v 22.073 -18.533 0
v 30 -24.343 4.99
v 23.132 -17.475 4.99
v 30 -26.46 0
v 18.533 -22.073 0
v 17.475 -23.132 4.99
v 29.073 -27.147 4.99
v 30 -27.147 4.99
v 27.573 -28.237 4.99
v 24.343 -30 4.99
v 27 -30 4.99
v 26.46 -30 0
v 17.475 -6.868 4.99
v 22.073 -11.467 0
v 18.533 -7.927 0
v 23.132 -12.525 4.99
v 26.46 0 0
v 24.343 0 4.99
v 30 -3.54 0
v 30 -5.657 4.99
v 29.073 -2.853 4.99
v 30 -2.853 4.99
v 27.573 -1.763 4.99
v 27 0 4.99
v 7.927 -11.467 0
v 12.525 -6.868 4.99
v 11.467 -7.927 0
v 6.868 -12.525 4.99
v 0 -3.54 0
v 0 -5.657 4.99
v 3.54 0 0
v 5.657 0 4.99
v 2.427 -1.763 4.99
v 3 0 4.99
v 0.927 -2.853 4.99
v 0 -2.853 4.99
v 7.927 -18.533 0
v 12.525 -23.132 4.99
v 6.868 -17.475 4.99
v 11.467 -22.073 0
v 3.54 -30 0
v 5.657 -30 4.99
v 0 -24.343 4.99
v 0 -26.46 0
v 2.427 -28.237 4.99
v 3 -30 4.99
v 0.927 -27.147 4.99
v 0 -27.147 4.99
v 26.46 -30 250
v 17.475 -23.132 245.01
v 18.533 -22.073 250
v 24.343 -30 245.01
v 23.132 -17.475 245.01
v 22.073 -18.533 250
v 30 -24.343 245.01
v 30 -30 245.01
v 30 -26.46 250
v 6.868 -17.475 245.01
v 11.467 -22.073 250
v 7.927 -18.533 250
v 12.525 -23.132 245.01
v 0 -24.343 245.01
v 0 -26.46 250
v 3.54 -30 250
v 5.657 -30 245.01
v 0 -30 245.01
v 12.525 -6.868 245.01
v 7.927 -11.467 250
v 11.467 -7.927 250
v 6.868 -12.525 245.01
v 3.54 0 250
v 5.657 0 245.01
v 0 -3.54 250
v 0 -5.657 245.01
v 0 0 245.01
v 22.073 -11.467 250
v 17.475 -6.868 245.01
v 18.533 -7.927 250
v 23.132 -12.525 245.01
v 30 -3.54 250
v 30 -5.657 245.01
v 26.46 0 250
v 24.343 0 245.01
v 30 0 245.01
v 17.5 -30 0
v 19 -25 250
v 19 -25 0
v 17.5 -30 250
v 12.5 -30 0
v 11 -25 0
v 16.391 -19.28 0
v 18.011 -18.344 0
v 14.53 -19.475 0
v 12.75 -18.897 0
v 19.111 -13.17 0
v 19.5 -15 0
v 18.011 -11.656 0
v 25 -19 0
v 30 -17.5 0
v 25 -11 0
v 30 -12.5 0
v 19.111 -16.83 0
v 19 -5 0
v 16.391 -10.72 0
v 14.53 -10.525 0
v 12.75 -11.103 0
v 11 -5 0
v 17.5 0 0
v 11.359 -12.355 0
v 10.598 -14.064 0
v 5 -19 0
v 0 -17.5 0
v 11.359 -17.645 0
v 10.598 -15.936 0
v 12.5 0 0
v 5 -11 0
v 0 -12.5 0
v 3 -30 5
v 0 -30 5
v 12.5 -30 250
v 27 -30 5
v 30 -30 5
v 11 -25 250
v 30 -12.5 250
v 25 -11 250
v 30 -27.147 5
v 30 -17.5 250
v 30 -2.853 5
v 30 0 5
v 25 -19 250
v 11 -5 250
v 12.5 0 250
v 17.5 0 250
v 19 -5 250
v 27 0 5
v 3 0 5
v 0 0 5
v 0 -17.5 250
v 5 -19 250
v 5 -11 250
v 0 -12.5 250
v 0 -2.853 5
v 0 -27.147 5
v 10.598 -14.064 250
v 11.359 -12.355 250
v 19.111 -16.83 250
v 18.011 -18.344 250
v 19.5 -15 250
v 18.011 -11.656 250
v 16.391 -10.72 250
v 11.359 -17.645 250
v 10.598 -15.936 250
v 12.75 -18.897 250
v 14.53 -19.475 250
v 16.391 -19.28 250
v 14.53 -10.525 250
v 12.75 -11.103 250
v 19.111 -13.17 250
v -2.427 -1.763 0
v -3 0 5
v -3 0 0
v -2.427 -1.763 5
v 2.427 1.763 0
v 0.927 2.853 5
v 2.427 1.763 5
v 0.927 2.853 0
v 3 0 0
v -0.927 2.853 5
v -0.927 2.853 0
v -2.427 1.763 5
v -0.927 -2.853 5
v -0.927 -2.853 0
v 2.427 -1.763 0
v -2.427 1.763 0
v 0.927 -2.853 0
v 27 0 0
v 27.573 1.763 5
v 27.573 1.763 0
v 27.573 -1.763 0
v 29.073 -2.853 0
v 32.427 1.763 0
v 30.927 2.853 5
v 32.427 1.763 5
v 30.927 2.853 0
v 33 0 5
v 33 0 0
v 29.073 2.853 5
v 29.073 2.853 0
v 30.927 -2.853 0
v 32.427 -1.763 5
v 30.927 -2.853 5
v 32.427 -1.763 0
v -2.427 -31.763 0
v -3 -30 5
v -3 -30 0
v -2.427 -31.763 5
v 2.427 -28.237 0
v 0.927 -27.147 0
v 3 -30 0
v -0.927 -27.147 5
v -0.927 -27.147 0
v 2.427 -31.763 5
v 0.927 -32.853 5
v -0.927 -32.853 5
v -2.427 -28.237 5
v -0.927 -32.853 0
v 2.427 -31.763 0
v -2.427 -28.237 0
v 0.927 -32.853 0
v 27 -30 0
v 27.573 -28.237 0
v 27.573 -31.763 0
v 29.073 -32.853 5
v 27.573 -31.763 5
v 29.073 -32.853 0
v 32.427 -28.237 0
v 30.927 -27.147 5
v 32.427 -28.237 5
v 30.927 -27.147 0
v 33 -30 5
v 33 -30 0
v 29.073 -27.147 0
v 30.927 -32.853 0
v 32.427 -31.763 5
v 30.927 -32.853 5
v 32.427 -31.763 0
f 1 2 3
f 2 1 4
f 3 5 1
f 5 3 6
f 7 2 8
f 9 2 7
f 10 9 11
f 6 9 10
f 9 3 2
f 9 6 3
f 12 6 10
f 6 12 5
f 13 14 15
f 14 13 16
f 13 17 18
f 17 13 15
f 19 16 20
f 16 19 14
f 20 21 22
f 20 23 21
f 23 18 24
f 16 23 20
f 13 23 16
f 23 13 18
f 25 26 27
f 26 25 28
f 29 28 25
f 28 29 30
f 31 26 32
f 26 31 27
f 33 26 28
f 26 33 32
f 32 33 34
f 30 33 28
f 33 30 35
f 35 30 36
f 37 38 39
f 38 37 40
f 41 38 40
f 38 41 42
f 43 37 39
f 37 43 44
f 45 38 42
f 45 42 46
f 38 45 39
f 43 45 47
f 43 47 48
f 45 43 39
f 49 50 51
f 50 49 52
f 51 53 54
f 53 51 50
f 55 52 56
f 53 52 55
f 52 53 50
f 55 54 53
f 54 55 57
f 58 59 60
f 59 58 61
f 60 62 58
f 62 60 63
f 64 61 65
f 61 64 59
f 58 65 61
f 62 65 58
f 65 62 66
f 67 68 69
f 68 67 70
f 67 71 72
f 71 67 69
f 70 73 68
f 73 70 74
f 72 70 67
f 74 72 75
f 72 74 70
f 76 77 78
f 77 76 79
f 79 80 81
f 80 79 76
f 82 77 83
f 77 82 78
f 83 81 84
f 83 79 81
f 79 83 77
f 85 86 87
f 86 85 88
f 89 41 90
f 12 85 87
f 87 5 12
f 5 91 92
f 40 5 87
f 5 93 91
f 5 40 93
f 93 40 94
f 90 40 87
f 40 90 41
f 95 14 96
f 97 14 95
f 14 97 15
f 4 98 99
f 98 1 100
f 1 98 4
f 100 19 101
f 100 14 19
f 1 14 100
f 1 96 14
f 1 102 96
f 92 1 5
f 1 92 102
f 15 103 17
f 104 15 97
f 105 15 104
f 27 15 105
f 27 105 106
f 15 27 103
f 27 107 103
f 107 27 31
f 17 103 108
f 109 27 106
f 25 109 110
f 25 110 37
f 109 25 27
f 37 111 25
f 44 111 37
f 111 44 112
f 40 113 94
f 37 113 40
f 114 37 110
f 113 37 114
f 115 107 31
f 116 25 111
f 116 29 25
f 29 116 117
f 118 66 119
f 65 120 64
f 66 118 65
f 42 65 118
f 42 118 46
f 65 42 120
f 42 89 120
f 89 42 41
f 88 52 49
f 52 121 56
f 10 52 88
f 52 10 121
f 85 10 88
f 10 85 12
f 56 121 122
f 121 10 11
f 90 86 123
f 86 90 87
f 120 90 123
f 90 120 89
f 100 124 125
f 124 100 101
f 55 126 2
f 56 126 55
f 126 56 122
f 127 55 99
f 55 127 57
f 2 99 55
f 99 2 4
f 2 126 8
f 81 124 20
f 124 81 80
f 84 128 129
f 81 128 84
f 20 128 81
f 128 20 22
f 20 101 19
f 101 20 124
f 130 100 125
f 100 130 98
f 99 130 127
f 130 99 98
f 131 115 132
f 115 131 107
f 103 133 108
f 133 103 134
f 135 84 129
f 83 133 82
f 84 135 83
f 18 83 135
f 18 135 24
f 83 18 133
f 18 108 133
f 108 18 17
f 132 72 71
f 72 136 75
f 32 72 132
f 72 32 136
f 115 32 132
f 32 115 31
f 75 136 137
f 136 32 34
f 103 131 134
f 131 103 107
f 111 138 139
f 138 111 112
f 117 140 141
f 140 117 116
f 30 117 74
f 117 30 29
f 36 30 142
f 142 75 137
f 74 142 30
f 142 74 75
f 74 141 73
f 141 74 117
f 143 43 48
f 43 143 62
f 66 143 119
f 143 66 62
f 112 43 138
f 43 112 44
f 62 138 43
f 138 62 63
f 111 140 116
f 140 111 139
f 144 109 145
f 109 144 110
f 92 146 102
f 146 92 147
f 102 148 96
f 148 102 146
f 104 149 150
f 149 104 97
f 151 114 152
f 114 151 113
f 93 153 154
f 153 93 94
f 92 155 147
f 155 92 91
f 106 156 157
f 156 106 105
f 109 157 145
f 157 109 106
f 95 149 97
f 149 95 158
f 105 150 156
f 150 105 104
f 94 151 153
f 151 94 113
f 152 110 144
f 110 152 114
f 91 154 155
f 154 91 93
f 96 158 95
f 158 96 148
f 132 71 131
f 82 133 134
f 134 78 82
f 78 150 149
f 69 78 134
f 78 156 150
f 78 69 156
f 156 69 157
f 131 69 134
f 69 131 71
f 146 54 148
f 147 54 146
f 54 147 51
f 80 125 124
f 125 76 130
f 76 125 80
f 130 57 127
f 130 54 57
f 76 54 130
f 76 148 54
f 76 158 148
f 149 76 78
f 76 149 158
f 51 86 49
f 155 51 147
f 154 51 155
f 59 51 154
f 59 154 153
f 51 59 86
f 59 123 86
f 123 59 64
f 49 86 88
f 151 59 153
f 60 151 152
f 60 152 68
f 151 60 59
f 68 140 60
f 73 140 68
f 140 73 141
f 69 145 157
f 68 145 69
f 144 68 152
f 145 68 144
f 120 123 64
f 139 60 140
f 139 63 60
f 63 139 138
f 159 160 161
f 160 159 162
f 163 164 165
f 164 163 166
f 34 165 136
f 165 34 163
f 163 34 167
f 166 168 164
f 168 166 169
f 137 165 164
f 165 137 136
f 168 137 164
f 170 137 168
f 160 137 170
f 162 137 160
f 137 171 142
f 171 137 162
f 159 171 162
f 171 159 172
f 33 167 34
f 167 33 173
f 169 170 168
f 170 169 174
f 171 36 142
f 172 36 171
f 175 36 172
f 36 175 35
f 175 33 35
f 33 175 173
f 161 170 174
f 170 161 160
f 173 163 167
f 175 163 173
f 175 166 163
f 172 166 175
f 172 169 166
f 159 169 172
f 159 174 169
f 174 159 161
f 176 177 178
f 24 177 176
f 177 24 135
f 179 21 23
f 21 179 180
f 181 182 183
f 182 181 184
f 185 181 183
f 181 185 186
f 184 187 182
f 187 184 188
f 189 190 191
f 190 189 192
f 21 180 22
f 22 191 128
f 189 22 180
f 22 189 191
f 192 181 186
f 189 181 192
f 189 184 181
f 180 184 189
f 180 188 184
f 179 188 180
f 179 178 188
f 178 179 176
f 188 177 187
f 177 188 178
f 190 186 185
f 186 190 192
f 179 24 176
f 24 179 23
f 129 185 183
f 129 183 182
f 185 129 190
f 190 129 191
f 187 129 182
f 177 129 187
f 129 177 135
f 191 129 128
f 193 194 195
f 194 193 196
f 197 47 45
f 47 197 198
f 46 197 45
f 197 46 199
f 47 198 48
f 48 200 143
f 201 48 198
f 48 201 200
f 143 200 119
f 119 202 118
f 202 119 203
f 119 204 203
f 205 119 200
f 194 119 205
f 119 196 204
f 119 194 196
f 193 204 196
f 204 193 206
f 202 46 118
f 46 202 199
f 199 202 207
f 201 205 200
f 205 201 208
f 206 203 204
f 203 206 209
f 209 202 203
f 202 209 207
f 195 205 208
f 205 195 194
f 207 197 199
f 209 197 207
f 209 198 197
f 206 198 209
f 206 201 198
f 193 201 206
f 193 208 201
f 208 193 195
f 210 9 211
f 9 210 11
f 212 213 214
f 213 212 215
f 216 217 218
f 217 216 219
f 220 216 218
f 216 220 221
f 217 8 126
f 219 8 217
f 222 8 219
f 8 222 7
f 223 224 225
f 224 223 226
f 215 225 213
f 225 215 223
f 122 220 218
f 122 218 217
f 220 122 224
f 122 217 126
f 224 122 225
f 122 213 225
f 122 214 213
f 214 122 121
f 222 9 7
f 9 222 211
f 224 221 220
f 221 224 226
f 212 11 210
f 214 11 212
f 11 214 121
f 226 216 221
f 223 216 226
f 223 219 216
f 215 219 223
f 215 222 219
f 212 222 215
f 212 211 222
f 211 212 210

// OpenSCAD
// file: ../../globals.scad
/*
Most things in this file is represented as one millimeter, so keep that in mind while changing things.
Some of the setting are not mm but at variables that you can set, such as 2*x=2x and you are setting what x is.
I will try to specify when things are variables and not exact measurements.
*/

// printer slop, used by snappy parts
slop = 0.15;

//Virindi settings
dovetail_male_width_scale = 0.98;
dovetail_male_height_scale = 0.91;

obj_leg = 30;
leg_length = 5.5;
small_number = 0.001;
metal_core_rode_global = 5;


///////////////// number of holes /////////////////////
z_hole_number = 8;
other_holes = 8;

///////////////// Pins /////////////////////

//pins that poke out
ball_size = 10;
pin_height = 20;
pin_diameter = 6;


//holes
hole_ball_size = ball_size;
hole_pin_height = pin_height;
hole_pin_diameter = pin_diameter;

///////////////// Z THINGS /////////////////////

berring_slot_width = 7.5;
berring_slot_depth = 6.5;
metal_core_rode = 5;

///////////////// X THINGS /////////////////////

//male dove tails
max_width=8;
min_width=5;
depth=5;
height=obj_leg/2;

//female dove tails, this is found on the y mounts
girl_max_width=11;
girl_min_width=5;
girl_depth=5;
girl_height=obj_leg;


///////////////// Y THINGS /////////////////////
/*
The Y is so normal that all of those global variables at the top should change all of the setting in it, this section is set her incase there are variables set in the future development of this project.
*/

// stepper
motor_side_length = 43.2;
motor_bolt_hole_distance = 31;
motor_center_hole = 23;
motor_shaft_dia = 5;
motor_shaft_hole_dia = 5+2*slop;

// bolts etc.
bolt_hole_dia = 3+2*slop;
bolt_head_hole_dia = 5.8;

m3_nut_side = 5.65;

// threaded rod
lifter_rod_diam = 9.86;
hole_threaded_rod = lifter_rod_diam+2*slop;
// file: ../../include.scad
use <globals.scad>

//////////////////      END SECTION       //////////////////

	module added_pins(){
		difference(){
			union(){
				translate([30/(15/4),obj_leg*leg_length,30/(15/4)]) pin();
				translate([30/(15/4)+14.5,obj_leg*leg_length,30/(15/4)+14]) pin();
			}
			union(){
							translate([30/(15/4)+13.5,obj_leg*leg_length-20,30/(15/4)+5])cube(size=[2,40,15]);
							translate([30/(15/4)+7.5,obj_leg*leg_length-20,30/(15/4)+15])rotate([0,90,0]) cube(size=[2,40,15]);	

							translate([30/(15/4)-1,obj_leg*leg_length-20,30/(15/4)-8])cube(size=[2,40,15]);
							translate([30/(15/4)-10,obj_leg*leg_length-20,30/(15/4)+1])rotate([0,90,0]) cube(size=[2,40,15]);
			}
		}
	}
	module taken_pins() {
		translate([30/(15/4)+14,obj_leg*leg_length-10,30/(15/4)]) mirror_pin();
		translate([30/(15/4),obj_leg*leg_length-10,30/(15/4)+15]) mirror_pin();
	}


//////////////////      OTHER STUFF       //////////////////

	module holes() {
		rotate([0,0,90]) for(y=[0:other_holes])
		translate([obj_leg+y*15,-15.5,7.5]) union() {
			translate([7.5,0,15]) hole_up();
			hole_down();
		}
	}
	module extend_holes() {
	module top(){
		rotate([0,0,90]) for(y=[0:other_holes+1])
		translate([(30/4)+y*15,-15.5,7.5]) union() {
			translate([7.5,0,15]) hole_up();
		}
	}
	module bottom(){
		rotate([0,0,90]) for(y=[0:other_holes+2])
		translate([(30/4)+y*15,-15.5,7.5]) union() {
			hole_down();
		
}
	}
	union(){
		top();
		bottom();
	}
	}

	module hole() {
		union() {
			rotate([90, 90, 0]) cylinder(h=40, d=hole_pin_diameter, center=true);
			translate([0,7.5,0]) sphere(d=hole_ball_size);
			translate([0,-6,0]) sphere(d=hole_ball_size);
		}
	}
	module hole_up() {
		union() {
			rotate([90, 90, 0]) cylinder(h=40, d=hole_pin_diameter, center=true);
			translate([0,7.5,10]) cylinder(h=hole_pin_height, d=hole_pin_diameter, center=true);
			translate([0,-6,10]) cylinder(h=hole_pin_height, d=hole_pin_diameter, center=true);
			translate([0,7.5,0]) sphere(d=hole_ball_size);
			translate([0,-6,0]) sphere(d=hole_ball_size);
		}
	}
	module hole_down() {
		union() {
			rotate([90, 90, 0]) cylinder(h=40, d=hole_pin_diameter, center=true);
			translate([0,7.5,-10]) cylinder(h=hole_pin_height, d=hole_pin_diameter, center=true);
			translate([0,-6,-10]) cylinder(h=hole_pin_height, d=hole_pin_diameter, center=true);
			translate([0,7.5,0]) sphere(d=hole_ball_size);
			translate([0,-6,0]) sphere(d=hole_ball_size);
		}
	}
	module pin() {
		union() {
			rotate([90, 90, 0]) cylinder(h=pin_height, d=pin_diameter, center=true);
			translate([0,7.5,0]) sphere(d=ball_size);
		}
	}

	module mirror_pin() {
		rotate([90, 90, 0]) cylinder(h=hole_pin_height+small_number, d=hole_pin_diameter, center=true);
		translate([0,-(pin_height-(ball_size/2)),0]) sphere(d=ball_size);
	}


//////////////////      SOME RACK AND Z THINGS       //////////////////

module z_holes() {
    rotate([0,-90,0]) for(z=[0:z_hole_number])
    translate([22.5+z*15,16,-12])
        hole();
}

module pin_cuts() {
	union(){
		cube(size=[2,10,40], center=true);
		rotate([0,0,90]) cube(size=[2,10,40], center=true);
	}
}
module pin_uncut() {
	union(){
		rotate([0, 0, 90]) cylinder(h=hole_pin_height, d=hole_pin_diameter, center=true);
		translate([0,0,10]) sphere(d=ball_hole);
	}
}


module pin_out() {
	union(){
		rotate([0, 0, 90]) cylinder(h=pin_height, d=pin_diameter, center=true);
		translate([0,0,10]) sphere(d= ball_size);
	}
}


module pins_z(){
	difference() {
		pin_out();
		pin_cuts();
	}
}

module rounded_cube(width,depth,height){
    hull(){
        translate([width/2-diameter/2,depth/2-diameter/2,height/2-diameter/2]) sphere(d=diameter);
        translate([width/2-(diameter/2),depth/2-(diameter/2),-height/2+(diameter/2)]) sphere(d=diameter);
        translate([-width/2+diameter/2,depth/2-diameter/2,height/2-diameter/2]) sphere(d=diameter);
        translate([-width/2+(diameter/2),depth/2-(diameter/2),-height/2+(diameter/2)]) sphere(d=diameter);
        
        translate([width/2-diameter/2,-depth/2+diameter/2,height/2-diameter/2]) sphere(d=diameter);
        translate([width/2-(diameter/2),-depth/2+(diameter/2),-height/2+(diameter/2)]) sphere(d=diameter);
        translate([-width/2+diameter/2,-depth/2+diameter/2,height/2-diameter/2]) sphere(d=diameter);
        translate([-width/2+(diameter/2),-depth/2+(diameter/2),-height/2+(diameter/2)]) sphere(d=diameter);
    }
}

module motor_shaft_hole(h=10) {
    difference() {
        cylinder(d=motor_shaft_hole_dia, h=h);
        translate([0,4.5,h/2]) cube([5,5,h], center=true); 
    }
}
//////////////////      RACK AND SLIDE     ///////////////////

module straight_pins() {
	for(z=[0:((((obj_leg*leg_length)*2)-(obj_leg*2))/3)/14.5]) rotate([-90,0,0]) translate([z*15,30/(15/4),14]) pins_z();
	for(z=[0:((((obj_leg*leg_length)*2)-(obj_leg*2))/3)/14.5]) rotate([-90,0,0]) translate([z*15,30/(15/4)-14,14]) pins_z();
}
module stagger_pins() {
	for(z=[0:((((obj_leg*leg_length)*2)-(obj_leg*2))/3)/14.5]) rotate([-90,0,0]) translate([z*15,30/(15/4),14]) pins_z();
	for(z=[0:((((obj_leg*leg_length)*2)-(obj_leg*2))/3)/14.5]) rotate([-90,0,0]) translate([z*15+7,30/(15/4)-14,14]) pins_z();
}


//////////////////      DOVE TAIL       //////////////////

module male_dovetail(height) {
	dovetail_3d(max_width,min_width,depth,height);
}

module dovetail_3d(max_width=11, min_width=5, depth=5, height=30) {
	linear_extrude(height=height, convexity=2)
		dovetail_2d(max_width,min_width,depth);
}

module dovetail_2d(max_width=11, min_width=5, depth=5) {
	angle=atan((max_width/2-min_width/2)/depth);
	echo("angle: ", angle);
	polygon(paths=[[0,1,2,3,0]], points=[[-min_width/2,0], [-max_width/2,depth], [max_width/2, depth], [min_width/2,0]]);
}

//bow tie
	module tie_end(height){
				rotate([0,0,0]) translate([0,-0.01,((obj_leg/2)/2)]) male_dovetail(height);
				rotate([0,90,0]) translate([0,-0.01,((obj_leg/2)/2)]) male_dovetail(height);
				rotate([0,180,0]) translate([0,-0.01,((obj_leg/2)/2)]) male_dovetail(height);
				rotate([0,-90,0]) translate([0,-0.01,((obj_leg/2)/2)]) male_dovetail(height);
	}

module bow_support(){
	difference(){
		intersection(){
			translate([-15,0,-15]) cube([30,9,30]);
			scale([1.05,1.05,1.05]) rotate([0,45,0]) tie_end();
		}
		cube([29.2,29.2,29.2], center=true);
	}
}

	module wrap(units){
	for (y = [-1:units-2]) // two iterations, z = -1, z = 1
	{
			translate([15, (y*30)+15, 15]){
			for (r = [0:4]) // two iterations, z = -1, z = 1
			{
				rotate([0,r*90,0]) translate([0,15,15]) rotate([-90,0,0])male_dovetail(height=30);
			}
		}
	}
	}
// file: ../printed_structural/extension.scad
include <../../include.scad>;
include <../../globals.scad>;
metal_rod_size = 9;
//support = true;
//min number of units is 2
//max is however large your printer can print

module extension(units = 4){
	
	module added(){
			translate([0,0,0]) cube([30,30*units,30]);
	}

	module subtracted(){
	translate([15,0,15]) rotate([0,45,0]) tie_end();
	translate([15,units*30,15]) rotate([0,45,0]) rotate([0,0,180]) tie_end();
	translate([15,15,15]) rotate([90,0,0]) cylinder(h=5000, d= metal_rod_size, center=true);

	for (y = [-1:units]) // two iterations, z = -1, z = 1
	{
			translate([15, (y*30)+15, 15]){
			for (r = [0:4]) // two iterations, z = -1, z = 1
			{
				rotate([0,r*90,0]) translate([0,15,15]) rotate([-90,0,0])male_dovetail(height=30);
			}
		}
	}

	} //subtracted
	difference(){
		added();
		subtracted();
	}	
} //module extension

module extension_finished(units = 4, support = false){
		rotate([90,0,0]) extension(units);
    
    if (support==true)
    {
        translate([0,0,5/2]) cylinder(h=5, d=6, center=true);
        translate([30,0,5/2]) cylinder(h=5, d=6, center=true);
        translate([0,-30,5/2]) cylinder(h=5, d=6, center=true);
        translate([30,-30,5/2]) cylinder(h=5, d=6, center=true);
    }
}

//extension_finished(units=8.333);
// main file
use <../printed_structural/extension.scad>

extension_finished(units=250/30, support=true);
